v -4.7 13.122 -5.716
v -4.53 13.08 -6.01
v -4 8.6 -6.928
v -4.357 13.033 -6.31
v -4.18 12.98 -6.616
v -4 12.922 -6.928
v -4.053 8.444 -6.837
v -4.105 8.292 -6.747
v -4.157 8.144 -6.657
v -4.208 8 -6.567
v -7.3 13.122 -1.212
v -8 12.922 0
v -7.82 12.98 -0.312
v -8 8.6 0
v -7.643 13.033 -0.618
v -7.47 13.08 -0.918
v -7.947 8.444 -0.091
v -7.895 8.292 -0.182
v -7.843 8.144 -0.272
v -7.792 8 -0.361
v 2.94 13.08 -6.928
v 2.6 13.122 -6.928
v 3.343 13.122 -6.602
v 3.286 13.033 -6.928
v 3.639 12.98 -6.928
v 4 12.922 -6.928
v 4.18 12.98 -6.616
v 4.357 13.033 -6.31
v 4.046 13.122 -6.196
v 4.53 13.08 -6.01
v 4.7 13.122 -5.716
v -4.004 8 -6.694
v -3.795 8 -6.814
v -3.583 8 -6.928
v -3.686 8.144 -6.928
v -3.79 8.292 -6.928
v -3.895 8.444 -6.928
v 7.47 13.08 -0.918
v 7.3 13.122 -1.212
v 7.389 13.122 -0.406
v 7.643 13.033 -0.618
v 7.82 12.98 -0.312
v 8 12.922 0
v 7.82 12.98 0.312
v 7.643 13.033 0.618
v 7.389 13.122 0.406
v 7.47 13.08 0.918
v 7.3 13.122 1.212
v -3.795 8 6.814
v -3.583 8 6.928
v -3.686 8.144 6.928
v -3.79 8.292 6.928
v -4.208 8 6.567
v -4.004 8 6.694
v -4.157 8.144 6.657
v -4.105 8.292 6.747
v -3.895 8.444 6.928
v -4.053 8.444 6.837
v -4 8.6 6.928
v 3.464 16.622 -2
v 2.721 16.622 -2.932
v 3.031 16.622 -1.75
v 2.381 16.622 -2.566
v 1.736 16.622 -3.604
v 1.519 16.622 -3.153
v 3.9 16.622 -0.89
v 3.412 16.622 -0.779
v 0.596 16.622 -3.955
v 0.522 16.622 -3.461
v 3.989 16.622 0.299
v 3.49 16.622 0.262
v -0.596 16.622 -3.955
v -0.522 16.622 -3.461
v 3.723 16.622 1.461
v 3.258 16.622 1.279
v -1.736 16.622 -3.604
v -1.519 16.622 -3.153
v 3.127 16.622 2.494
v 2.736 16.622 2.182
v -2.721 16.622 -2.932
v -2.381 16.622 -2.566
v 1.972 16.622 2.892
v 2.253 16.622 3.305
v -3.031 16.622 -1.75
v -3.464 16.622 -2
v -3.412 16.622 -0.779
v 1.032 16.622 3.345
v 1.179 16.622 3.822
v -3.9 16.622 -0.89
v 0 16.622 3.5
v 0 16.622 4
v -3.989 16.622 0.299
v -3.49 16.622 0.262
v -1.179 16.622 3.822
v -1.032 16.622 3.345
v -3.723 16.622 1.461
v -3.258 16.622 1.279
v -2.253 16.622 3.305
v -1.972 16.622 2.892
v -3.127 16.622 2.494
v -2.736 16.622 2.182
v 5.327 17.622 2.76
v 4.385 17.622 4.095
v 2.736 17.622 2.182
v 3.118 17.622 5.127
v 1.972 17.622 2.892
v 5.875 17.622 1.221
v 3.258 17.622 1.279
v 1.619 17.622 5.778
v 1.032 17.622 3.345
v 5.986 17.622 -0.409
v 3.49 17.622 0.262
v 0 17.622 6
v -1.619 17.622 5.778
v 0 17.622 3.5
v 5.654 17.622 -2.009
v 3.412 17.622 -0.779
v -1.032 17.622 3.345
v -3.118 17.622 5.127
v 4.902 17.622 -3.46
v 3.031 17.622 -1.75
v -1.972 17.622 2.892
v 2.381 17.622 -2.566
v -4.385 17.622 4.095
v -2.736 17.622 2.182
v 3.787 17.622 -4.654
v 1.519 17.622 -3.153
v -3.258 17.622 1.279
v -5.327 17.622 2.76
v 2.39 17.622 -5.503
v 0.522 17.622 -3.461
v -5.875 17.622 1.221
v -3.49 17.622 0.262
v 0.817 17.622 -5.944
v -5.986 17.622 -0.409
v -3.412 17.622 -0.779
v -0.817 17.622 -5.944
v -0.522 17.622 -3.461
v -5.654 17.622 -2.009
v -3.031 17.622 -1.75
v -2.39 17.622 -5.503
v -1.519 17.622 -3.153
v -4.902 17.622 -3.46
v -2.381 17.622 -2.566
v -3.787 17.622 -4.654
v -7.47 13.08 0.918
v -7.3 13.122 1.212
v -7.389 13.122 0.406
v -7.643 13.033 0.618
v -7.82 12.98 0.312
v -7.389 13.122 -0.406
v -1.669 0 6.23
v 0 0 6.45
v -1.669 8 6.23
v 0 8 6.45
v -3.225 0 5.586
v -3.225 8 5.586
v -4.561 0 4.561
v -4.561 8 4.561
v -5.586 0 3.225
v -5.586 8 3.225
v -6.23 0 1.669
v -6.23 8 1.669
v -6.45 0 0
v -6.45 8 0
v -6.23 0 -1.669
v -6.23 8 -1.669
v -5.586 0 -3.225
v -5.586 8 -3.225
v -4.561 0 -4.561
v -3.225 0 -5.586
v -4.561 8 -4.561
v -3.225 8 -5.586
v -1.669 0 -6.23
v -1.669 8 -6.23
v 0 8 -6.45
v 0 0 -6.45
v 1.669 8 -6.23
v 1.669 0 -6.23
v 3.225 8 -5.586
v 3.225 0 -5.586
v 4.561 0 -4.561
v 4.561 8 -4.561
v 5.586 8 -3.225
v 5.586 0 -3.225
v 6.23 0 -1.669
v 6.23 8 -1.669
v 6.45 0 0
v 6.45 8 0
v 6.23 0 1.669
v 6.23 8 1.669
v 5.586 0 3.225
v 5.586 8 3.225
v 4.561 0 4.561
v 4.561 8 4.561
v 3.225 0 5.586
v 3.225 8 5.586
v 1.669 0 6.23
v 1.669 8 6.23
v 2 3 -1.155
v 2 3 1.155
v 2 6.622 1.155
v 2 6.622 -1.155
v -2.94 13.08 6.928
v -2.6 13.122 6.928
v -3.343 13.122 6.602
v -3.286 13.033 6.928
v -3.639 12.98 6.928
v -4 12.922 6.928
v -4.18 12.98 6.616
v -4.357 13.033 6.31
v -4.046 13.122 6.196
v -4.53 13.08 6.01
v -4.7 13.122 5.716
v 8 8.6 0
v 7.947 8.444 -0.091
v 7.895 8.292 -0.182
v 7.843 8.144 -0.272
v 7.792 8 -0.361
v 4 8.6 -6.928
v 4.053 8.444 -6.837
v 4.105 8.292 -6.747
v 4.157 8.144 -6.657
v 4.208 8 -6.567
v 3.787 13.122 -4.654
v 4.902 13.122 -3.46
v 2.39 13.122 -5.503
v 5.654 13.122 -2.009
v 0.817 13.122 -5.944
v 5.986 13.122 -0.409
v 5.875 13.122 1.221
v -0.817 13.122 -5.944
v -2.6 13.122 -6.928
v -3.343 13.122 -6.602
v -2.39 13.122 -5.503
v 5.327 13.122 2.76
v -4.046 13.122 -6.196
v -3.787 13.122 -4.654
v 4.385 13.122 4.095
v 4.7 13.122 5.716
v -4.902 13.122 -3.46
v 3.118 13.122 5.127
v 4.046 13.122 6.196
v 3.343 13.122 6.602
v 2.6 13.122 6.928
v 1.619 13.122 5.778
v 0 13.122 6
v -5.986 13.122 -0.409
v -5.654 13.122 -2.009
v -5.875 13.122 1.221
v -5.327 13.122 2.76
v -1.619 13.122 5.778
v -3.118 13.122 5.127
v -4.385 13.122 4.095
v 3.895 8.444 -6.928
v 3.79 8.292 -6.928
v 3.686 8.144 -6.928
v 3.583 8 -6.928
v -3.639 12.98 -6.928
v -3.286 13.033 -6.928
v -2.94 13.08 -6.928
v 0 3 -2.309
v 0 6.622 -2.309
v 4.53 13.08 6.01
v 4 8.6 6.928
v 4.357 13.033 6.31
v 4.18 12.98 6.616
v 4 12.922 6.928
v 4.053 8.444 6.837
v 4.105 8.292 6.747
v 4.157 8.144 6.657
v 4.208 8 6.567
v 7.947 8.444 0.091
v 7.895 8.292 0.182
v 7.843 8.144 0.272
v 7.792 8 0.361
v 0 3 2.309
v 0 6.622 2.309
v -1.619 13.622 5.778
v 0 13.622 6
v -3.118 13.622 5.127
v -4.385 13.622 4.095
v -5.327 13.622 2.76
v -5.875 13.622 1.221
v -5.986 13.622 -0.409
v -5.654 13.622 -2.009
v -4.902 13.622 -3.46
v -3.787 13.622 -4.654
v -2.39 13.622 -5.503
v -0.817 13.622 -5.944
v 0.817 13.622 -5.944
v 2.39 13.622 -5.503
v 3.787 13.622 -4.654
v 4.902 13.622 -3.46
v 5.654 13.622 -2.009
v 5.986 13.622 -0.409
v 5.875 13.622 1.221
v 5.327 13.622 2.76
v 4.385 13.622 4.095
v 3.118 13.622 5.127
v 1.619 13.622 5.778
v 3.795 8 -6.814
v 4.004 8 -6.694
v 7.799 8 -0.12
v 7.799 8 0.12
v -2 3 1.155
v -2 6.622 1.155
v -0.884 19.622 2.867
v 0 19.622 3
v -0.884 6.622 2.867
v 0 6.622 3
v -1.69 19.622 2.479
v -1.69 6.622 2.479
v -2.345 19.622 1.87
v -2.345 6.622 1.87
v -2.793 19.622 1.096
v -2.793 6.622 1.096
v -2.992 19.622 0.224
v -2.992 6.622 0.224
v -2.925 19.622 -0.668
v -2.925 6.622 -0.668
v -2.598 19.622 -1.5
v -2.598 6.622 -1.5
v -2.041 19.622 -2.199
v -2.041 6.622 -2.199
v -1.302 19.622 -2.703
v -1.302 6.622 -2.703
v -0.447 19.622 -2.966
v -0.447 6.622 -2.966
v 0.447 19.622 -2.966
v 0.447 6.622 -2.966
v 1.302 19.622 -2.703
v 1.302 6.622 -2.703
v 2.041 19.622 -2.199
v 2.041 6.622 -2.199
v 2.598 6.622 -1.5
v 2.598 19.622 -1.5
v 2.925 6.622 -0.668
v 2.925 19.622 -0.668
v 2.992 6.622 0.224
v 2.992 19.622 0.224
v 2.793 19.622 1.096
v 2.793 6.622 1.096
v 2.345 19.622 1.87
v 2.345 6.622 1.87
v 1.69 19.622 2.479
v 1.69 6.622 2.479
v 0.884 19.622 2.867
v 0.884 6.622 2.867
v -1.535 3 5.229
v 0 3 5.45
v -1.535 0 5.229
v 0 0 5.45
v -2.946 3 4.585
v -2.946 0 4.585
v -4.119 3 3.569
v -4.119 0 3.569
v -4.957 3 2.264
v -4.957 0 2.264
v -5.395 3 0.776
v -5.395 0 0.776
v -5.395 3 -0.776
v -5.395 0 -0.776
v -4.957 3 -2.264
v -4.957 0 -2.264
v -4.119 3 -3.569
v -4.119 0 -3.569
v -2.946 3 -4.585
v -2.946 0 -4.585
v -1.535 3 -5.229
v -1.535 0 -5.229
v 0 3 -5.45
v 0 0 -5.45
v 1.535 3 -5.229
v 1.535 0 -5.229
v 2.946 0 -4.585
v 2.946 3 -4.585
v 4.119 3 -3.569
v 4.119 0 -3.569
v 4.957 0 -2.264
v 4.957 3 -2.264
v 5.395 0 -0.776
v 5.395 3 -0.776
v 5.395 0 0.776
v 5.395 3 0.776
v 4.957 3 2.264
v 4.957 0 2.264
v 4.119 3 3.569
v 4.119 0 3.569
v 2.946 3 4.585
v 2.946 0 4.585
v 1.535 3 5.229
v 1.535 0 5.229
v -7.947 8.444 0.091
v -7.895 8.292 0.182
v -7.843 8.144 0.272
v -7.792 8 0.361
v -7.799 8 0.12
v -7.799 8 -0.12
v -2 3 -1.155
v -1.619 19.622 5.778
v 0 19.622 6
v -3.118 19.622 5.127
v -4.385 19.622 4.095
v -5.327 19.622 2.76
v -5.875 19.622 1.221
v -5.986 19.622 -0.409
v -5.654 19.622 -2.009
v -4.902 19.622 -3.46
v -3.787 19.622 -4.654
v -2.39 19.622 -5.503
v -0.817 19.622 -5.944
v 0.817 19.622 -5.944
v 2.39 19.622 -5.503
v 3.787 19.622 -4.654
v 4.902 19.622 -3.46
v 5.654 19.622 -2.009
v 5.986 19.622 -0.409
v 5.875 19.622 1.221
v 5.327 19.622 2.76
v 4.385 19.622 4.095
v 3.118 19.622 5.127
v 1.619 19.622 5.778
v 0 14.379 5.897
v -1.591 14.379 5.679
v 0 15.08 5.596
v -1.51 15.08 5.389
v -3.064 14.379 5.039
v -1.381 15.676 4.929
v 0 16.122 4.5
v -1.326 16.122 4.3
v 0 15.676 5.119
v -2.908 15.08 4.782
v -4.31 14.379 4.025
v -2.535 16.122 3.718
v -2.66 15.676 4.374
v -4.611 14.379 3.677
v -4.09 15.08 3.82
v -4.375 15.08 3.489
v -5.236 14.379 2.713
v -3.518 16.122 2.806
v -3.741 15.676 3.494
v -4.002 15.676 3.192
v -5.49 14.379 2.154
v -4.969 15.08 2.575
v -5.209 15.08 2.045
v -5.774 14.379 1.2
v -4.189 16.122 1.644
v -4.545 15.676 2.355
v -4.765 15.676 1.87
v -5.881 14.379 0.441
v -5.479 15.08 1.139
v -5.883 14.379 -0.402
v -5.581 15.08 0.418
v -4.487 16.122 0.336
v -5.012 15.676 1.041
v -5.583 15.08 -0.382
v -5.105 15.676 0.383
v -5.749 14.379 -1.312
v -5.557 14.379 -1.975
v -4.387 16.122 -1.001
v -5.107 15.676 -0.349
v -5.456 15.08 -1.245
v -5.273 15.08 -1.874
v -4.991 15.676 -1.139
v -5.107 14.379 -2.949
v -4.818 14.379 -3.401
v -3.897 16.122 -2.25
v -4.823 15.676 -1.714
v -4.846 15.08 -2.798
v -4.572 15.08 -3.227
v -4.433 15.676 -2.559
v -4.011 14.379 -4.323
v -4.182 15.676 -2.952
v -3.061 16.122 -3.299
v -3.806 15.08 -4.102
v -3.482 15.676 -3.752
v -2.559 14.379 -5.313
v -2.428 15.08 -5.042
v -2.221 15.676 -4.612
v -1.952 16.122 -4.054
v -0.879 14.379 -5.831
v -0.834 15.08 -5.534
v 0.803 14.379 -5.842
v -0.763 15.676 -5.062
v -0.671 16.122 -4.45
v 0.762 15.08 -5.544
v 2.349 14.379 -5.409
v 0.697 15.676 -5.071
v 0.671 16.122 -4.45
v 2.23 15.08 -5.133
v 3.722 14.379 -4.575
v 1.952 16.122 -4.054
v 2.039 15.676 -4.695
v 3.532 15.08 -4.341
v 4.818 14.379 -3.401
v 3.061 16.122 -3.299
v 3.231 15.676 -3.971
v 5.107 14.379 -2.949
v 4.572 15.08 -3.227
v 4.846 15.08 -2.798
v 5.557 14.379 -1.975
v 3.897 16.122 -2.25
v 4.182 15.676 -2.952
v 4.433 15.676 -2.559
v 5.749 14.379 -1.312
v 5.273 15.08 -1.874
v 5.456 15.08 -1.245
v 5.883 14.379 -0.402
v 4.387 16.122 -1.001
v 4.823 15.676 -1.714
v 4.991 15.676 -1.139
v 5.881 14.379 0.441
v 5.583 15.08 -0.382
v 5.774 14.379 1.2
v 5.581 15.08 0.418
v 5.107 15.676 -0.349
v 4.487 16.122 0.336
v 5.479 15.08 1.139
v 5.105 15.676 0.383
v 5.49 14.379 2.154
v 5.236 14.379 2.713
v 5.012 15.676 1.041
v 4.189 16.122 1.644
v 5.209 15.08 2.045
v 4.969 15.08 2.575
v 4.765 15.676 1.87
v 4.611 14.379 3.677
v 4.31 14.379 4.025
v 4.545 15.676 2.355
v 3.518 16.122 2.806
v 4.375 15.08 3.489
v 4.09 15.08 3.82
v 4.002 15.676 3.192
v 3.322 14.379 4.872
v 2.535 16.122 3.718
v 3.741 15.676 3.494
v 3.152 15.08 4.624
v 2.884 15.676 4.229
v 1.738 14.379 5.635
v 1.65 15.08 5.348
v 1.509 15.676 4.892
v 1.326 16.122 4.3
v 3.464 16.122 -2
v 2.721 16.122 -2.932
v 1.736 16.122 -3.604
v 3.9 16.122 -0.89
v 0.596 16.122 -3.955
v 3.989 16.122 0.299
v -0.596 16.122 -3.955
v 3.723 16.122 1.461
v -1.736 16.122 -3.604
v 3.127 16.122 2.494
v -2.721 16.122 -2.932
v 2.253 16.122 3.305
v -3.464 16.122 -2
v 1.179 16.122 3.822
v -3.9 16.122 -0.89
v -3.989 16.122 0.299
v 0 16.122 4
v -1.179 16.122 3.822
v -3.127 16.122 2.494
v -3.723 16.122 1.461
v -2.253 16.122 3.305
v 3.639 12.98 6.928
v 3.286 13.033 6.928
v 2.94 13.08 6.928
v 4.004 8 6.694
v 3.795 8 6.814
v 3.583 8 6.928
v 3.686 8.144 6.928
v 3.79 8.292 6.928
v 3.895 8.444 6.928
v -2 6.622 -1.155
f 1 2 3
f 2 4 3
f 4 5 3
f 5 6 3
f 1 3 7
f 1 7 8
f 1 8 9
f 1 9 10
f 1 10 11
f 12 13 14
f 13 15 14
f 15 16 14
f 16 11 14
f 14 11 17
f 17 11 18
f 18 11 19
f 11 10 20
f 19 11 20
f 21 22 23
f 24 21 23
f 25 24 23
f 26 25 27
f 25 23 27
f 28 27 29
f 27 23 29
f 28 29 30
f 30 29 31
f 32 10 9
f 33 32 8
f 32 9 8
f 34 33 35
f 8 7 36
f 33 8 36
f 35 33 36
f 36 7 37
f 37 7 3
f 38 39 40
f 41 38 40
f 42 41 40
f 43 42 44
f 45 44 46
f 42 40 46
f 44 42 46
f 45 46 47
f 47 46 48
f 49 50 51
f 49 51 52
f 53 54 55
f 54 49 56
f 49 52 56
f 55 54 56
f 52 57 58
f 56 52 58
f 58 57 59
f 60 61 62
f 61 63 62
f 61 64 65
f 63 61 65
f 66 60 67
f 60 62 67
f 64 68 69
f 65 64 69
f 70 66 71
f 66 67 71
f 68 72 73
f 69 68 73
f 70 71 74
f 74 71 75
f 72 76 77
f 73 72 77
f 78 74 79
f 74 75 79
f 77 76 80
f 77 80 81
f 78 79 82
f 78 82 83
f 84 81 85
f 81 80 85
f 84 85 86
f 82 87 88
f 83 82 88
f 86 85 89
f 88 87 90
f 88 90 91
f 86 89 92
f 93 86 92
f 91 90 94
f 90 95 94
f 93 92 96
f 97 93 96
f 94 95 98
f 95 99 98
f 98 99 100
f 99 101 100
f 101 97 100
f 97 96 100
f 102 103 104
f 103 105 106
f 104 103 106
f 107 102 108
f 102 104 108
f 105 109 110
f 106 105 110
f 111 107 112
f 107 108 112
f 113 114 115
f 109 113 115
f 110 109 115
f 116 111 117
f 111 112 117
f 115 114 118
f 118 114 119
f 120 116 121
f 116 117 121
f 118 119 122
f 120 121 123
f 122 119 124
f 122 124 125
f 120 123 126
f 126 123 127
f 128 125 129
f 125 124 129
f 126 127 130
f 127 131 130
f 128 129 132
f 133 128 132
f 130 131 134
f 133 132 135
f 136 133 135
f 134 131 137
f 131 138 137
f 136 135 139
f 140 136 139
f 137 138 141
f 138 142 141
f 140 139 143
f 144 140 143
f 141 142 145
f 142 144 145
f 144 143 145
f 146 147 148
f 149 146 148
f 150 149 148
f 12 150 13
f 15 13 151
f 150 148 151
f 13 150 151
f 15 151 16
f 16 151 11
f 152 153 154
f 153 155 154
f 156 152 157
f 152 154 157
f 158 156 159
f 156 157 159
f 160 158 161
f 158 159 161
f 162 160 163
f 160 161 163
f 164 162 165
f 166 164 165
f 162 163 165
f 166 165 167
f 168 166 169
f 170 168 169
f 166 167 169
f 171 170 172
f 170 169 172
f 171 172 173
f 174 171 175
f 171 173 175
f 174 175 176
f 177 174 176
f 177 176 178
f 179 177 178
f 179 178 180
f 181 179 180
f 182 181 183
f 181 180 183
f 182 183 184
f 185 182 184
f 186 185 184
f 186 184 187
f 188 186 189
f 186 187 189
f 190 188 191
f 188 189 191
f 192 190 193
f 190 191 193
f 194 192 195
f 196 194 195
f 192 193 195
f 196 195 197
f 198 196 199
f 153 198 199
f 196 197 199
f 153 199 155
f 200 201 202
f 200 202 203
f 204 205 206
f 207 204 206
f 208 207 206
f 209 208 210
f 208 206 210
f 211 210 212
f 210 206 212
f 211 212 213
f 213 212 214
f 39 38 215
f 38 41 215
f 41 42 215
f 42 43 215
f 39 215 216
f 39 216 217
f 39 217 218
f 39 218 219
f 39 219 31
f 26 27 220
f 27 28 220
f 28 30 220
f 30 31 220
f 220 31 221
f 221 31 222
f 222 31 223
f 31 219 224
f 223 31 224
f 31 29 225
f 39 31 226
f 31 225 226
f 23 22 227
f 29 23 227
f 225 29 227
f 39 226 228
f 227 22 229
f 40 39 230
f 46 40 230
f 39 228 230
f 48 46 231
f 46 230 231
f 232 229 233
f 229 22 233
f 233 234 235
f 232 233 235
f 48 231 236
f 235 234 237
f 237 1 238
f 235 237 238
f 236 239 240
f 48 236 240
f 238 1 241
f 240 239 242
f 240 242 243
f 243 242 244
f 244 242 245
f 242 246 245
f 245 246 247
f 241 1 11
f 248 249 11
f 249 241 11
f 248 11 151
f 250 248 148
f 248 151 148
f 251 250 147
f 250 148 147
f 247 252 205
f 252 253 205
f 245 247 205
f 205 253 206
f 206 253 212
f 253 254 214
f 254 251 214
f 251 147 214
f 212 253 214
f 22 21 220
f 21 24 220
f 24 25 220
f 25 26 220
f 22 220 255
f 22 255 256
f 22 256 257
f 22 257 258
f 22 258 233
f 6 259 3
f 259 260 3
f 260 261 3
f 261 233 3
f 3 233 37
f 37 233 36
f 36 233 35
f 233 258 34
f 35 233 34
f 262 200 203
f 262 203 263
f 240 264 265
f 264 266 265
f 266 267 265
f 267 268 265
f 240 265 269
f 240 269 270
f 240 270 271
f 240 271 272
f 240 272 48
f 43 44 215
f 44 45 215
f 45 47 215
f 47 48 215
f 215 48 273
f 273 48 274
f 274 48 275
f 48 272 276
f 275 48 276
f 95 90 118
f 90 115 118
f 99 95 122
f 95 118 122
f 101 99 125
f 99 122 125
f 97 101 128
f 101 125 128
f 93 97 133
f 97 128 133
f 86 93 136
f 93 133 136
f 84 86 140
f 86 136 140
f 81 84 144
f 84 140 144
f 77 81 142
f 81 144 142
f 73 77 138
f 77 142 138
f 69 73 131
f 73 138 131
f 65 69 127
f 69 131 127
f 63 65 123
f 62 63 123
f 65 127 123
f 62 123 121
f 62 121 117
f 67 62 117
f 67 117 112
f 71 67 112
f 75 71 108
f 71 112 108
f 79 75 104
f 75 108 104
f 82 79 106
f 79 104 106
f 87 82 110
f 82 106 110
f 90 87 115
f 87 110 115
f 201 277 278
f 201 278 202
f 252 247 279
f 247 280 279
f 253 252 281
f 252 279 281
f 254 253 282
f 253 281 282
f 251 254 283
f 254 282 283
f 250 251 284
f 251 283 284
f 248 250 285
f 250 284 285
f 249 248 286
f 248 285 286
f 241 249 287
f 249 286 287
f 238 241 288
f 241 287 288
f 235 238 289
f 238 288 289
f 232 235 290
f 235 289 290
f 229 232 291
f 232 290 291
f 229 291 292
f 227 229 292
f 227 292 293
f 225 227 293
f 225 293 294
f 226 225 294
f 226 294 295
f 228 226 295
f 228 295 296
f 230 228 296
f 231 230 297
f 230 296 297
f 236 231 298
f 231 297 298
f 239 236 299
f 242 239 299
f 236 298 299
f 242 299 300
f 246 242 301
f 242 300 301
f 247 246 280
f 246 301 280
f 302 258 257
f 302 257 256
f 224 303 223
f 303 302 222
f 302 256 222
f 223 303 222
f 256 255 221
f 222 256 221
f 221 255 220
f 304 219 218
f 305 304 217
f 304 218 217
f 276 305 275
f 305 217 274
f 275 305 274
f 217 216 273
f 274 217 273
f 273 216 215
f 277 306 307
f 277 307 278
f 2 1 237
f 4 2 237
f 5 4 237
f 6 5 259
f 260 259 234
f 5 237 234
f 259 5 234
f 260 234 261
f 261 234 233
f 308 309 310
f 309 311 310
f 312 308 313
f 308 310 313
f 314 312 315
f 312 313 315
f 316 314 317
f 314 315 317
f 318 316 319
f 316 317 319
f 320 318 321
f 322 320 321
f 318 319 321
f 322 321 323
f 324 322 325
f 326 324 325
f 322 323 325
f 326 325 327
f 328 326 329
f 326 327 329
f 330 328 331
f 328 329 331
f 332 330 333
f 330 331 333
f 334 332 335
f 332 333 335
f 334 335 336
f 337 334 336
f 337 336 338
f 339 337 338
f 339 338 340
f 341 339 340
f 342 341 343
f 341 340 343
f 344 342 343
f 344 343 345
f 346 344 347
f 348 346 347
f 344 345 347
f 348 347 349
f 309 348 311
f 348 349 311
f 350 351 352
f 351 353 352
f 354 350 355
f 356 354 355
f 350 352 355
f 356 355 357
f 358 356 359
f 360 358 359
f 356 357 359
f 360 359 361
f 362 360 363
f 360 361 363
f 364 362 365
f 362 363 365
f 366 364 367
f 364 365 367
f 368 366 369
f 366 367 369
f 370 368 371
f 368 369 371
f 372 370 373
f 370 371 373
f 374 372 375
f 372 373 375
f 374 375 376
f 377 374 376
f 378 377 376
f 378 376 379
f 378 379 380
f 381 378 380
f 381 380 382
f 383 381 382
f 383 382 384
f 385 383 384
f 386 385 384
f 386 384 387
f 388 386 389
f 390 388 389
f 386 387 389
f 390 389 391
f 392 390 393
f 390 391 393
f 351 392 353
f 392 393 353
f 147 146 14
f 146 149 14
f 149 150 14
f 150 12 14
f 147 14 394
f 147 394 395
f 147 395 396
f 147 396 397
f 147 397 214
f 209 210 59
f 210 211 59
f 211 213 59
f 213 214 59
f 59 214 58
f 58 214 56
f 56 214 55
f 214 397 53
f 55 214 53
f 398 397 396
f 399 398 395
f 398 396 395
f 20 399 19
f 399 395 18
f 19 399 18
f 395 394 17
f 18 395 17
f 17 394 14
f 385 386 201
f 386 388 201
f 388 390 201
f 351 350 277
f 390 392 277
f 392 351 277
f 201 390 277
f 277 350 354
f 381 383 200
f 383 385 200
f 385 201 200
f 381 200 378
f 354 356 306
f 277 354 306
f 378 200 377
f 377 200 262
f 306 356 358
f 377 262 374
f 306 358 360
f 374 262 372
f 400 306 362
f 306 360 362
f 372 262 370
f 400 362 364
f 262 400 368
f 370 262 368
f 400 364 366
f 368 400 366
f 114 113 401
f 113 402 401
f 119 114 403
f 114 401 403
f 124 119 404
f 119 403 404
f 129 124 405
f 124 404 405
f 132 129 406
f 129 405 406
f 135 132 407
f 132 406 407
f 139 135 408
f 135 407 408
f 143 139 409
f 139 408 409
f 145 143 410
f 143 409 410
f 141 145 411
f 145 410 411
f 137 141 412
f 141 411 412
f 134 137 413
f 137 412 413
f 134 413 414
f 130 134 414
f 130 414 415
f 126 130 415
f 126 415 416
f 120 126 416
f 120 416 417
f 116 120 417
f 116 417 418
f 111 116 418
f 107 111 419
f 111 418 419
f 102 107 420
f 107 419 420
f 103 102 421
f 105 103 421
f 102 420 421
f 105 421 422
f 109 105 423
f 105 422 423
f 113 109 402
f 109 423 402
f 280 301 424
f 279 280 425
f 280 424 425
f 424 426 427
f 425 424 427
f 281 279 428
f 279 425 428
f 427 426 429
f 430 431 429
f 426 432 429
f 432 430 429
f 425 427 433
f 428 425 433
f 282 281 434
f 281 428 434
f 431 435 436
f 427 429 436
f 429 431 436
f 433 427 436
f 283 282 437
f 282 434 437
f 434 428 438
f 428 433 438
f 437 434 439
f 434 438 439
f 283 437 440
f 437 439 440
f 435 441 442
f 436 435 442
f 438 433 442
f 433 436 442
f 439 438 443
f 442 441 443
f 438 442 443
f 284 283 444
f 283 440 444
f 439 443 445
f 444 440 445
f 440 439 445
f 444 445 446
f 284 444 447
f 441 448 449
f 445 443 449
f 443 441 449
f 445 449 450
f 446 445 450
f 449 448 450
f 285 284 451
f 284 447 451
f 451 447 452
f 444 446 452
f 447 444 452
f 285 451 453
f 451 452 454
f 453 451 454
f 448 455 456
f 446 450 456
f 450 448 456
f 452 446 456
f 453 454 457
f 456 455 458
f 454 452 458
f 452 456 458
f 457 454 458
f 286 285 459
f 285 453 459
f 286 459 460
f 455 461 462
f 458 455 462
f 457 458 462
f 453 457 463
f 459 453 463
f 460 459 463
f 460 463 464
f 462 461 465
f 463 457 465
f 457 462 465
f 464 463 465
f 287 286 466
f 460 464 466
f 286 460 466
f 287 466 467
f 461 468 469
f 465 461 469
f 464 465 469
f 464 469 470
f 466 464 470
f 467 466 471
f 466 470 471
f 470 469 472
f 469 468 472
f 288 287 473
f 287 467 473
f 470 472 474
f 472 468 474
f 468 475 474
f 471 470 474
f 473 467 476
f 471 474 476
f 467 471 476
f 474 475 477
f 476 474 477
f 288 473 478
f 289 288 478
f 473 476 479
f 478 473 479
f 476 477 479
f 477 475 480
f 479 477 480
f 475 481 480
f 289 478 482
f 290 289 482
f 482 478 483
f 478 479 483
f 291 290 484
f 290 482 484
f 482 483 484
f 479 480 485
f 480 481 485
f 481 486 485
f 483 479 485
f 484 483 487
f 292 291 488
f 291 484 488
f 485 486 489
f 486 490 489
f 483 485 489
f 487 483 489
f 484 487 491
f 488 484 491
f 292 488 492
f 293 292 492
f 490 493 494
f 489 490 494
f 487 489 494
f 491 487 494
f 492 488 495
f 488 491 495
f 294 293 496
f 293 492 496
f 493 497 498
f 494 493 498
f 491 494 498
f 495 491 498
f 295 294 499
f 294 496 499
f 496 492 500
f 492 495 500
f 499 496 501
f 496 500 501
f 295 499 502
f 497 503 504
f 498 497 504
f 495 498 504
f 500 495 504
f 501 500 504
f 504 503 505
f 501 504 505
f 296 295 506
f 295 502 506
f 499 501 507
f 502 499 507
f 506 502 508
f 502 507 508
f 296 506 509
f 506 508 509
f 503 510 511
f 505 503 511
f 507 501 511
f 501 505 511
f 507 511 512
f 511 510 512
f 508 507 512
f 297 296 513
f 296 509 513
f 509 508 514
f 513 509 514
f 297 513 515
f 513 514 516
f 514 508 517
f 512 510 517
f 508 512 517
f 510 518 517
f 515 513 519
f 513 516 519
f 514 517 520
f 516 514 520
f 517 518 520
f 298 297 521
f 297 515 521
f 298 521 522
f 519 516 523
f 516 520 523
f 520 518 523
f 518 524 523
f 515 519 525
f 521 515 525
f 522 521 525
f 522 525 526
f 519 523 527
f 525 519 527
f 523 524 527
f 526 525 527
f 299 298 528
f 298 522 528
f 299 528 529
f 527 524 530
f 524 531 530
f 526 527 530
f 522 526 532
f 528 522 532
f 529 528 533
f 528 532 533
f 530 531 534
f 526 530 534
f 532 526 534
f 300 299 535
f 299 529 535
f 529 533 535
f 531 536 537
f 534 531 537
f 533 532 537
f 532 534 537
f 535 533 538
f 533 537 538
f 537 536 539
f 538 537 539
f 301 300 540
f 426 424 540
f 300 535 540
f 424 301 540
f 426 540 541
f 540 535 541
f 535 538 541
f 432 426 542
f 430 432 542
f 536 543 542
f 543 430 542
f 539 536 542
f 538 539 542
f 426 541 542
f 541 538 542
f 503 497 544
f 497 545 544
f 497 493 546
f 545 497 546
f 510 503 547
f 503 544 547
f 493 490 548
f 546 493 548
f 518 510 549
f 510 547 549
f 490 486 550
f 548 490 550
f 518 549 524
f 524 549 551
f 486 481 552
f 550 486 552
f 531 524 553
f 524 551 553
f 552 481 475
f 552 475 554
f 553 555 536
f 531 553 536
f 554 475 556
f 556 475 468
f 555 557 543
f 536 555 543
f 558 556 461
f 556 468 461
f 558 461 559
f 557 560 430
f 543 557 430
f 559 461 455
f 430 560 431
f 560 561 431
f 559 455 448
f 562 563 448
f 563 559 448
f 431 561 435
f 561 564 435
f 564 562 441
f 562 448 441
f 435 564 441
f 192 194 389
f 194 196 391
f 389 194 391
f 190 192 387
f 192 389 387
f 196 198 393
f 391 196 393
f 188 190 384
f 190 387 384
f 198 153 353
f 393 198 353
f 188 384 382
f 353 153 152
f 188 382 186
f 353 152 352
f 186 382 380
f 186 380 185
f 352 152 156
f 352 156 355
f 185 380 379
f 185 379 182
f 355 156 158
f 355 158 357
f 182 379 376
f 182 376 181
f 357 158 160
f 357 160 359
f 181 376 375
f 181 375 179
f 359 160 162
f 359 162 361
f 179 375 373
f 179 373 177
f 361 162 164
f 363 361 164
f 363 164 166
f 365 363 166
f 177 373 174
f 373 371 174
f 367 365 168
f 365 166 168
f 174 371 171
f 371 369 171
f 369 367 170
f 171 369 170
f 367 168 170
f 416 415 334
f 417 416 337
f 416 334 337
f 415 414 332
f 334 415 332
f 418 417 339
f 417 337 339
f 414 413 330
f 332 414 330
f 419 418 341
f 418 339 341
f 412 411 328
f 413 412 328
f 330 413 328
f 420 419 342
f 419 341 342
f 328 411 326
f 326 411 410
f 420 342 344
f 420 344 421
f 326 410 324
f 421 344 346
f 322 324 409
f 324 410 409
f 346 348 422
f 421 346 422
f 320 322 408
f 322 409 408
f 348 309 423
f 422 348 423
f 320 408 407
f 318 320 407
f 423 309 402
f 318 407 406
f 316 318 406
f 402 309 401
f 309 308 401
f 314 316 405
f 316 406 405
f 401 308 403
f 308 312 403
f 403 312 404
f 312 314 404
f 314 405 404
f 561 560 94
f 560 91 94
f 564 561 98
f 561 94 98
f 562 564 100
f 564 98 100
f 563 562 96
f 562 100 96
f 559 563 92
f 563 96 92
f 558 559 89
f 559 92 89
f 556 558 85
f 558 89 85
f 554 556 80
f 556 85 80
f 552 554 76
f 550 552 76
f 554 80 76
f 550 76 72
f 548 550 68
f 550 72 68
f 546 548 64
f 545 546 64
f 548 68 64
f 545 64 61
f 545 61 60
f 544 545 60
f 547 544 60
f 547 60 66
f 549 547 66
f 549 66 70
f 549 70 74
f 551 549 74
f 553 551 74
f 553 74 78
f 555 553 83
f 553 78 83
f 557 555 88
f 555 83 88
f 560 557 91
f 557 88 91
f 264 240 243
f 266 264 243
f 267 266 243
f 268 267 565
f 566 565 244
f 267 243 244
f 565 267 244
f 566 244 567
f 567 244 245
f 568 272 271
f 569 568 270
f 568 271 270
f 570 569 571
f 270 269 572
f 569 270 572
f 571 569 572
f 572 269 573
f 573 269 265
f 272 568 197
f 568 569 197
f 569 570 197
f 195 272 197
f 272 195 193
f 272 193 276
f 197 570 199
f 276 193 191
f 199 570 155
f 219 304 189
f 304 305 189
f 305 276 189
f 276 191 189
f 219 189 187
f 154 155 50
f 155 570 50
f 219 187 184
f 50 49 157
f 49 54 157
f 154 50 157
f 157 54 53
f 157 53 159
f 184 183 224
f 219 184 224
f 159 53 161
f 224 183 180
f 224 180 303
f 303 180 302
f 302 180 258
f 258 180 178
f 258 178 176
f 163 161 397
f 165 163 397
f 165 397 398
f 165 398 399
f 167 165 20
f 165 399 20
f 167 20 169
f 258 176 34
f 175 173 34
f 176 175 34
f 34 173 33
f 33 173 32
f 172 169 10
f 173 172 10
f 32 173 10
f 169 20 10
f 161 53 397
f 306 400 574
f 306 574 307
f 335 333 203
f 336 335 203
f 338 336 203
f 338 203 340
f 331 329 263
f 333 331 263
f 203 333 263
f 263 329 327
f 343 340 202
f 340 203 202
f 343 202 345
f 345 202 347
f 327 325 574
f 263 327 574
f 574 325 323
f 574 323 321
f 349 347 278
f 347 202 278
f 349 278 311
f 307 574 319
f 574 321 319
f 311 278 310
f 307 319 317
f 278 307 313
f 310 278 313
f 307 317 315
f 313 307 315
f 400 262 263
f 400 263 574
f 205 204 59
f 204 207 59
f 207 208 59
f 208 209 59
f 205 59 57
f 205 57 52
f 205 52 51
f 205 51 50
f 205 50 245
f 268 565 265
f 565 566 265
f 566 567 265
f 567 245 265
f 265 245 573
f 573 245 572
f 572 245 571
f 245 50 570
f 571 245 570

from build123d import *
from OCP.BRepFilletAPI import BRepFilletAPI_MakeChamfer

# Parameters (mm, degrees)
CHAMFER_1_SIZE      = 0.2
CHAMFER_1_SIZE2     = 0.6
CUT_EXTRUDE_1_DEPTH = 6.622206177
SKETCH_3_R          = 13
CUT_EXTRUDE_3_DEPTH = 23.650187091


with BuildPart() as part:
    # 草图1 → 旋转1 (revolve)
    with BuildSketch(Plane.XY, mode=Mode.PRIVATE) as revolve_1_sk:
        with BuildLine():
            Line((6, 19.622206177), (3, 19.622206177))
            Line((3, 19.622206177), (3, 6.622206177))
            Line((3, 6.622206177), (0, 6.622206177))
            Line((0, 6.622206177), (0, 3))
            Line((0, 3), (5.45, 3))
            Line((5.45, 3), (5.45, 0))
            Line((5.45, 0), (6.45, 0))
            Line((6.45, 0), (6.45, 8))
            Line((6.45, 8), (8, 8))
            Line((8, 8), (8, 13.122206177))
            Line((8, 13.122206177), (6, 13.122206177))
            Line((6, 13.122206177), (6, 13.622206177))
            ThreePointArc((6, 13.622206177), (5.596229956, 15.079944151), (4.5, 16.122206177))
            Line((4.5, 16.122206177), (4, 16.122206177))
            Line((4, 16.122206177), (4, 16.622206177))
            Line((4, 16.622206177), (3.5, 16.622206177))
            Line((3.5, 16.622206177), (3.5, 17.622206177))
            Line((3.5, 17.622206177), (6, 17.622206177))
            Line((6, 17.622206177), (6, 19.622206177))
        make_face()
    revolve(revolve_1_sk.sketch.rotate(Axis((0, 26.759420291, 0), (0, -1, 0)), 90), axis=Axis((0, 26.759420291, 0), (0, -1, 0)))

    # 倒角1: one chamfer whose edges measure the first distance from different faces: ONE call of the kernel's chamfer builder (chamfer() names one face for all edges)
    chamfer_1_edges_1 = [part.edges().sort_by_distance(p)[0] for p in [
        (0, 13.122206177, -8),
    ]]
    chamfer_1_side_1 = [part.faces().sort_by_distance(p)[0] for p in [
        (0, 10.561103089, -8),
    ]]
    chamfer_1_edges_2 = [part.edges().sort_by_distance(p)[0] for p in [
        (0, 8, -8),
    ]]
    chamfer_1_side_2 = [part.faces().sort_by_distance(p)[0] for p in [
        (0, 8, -6.67627417),
    ]]
    chamfer_1 = BRepFilletAPI_MakeChamfer(part.part.solid().wrapped)
    for e in chamfer_1_edges_1:
        chamfer_1.Add(CHAMFER_1_SIZE, CHAMFER_1_SIZE2, e.wrapped, chamfer_1_side_1[0].wrapped)  # the first distance lies on this face
    for e in chamfer_1_edges_2:
        chamfer_1.Add(CHAMFER_1_SIZE, CHAMFER_1_SIZE2, e.wrapped, chamfer_1_side_2[0].wrapped)  # the first distance lies on this face
    add(Compound.cast(chamfer_1.Shape()), mode=Mode.REPLACE)

    # 草图2 → 切除-拉伸1 (cut)
    with BuildSketch(Plane(origin=(0, 0, 0), x_dir=(1, 0, 0), z_dir=(0, 1, 0))):
        Polygon((2, 1.154700538), (0, 2.309401077), (-2, 1.154700538), (-2, -1.154700538), (0, -2.309401077), (2, -1.154700538), align=None)
    extrude(amount=CUT_EXTRUDE_1_DEPTH, mode=Mode.SUBTRACT)

    # 草图3 → 切除-拉伸3 (cut, through all)
    with BuildSketch(Plane(origin=(0, 0, 0), x_dir=(1, 0, 0), z_dir=(0, 1, 0))):
        Circle(SKETCH_3_R)
        Polygon((8, 0), (4, 6.92820323), (-4, 6.92820323), (-8, 0), (-4, -6.92820323), (4, -6.92820323), align=None, mode=Mode.SUBTRACT)
    extrude(amount=CUT_EXTRUDE_3_DEPTH, mode=Mode.SUBTRACT)


solid = part.part
